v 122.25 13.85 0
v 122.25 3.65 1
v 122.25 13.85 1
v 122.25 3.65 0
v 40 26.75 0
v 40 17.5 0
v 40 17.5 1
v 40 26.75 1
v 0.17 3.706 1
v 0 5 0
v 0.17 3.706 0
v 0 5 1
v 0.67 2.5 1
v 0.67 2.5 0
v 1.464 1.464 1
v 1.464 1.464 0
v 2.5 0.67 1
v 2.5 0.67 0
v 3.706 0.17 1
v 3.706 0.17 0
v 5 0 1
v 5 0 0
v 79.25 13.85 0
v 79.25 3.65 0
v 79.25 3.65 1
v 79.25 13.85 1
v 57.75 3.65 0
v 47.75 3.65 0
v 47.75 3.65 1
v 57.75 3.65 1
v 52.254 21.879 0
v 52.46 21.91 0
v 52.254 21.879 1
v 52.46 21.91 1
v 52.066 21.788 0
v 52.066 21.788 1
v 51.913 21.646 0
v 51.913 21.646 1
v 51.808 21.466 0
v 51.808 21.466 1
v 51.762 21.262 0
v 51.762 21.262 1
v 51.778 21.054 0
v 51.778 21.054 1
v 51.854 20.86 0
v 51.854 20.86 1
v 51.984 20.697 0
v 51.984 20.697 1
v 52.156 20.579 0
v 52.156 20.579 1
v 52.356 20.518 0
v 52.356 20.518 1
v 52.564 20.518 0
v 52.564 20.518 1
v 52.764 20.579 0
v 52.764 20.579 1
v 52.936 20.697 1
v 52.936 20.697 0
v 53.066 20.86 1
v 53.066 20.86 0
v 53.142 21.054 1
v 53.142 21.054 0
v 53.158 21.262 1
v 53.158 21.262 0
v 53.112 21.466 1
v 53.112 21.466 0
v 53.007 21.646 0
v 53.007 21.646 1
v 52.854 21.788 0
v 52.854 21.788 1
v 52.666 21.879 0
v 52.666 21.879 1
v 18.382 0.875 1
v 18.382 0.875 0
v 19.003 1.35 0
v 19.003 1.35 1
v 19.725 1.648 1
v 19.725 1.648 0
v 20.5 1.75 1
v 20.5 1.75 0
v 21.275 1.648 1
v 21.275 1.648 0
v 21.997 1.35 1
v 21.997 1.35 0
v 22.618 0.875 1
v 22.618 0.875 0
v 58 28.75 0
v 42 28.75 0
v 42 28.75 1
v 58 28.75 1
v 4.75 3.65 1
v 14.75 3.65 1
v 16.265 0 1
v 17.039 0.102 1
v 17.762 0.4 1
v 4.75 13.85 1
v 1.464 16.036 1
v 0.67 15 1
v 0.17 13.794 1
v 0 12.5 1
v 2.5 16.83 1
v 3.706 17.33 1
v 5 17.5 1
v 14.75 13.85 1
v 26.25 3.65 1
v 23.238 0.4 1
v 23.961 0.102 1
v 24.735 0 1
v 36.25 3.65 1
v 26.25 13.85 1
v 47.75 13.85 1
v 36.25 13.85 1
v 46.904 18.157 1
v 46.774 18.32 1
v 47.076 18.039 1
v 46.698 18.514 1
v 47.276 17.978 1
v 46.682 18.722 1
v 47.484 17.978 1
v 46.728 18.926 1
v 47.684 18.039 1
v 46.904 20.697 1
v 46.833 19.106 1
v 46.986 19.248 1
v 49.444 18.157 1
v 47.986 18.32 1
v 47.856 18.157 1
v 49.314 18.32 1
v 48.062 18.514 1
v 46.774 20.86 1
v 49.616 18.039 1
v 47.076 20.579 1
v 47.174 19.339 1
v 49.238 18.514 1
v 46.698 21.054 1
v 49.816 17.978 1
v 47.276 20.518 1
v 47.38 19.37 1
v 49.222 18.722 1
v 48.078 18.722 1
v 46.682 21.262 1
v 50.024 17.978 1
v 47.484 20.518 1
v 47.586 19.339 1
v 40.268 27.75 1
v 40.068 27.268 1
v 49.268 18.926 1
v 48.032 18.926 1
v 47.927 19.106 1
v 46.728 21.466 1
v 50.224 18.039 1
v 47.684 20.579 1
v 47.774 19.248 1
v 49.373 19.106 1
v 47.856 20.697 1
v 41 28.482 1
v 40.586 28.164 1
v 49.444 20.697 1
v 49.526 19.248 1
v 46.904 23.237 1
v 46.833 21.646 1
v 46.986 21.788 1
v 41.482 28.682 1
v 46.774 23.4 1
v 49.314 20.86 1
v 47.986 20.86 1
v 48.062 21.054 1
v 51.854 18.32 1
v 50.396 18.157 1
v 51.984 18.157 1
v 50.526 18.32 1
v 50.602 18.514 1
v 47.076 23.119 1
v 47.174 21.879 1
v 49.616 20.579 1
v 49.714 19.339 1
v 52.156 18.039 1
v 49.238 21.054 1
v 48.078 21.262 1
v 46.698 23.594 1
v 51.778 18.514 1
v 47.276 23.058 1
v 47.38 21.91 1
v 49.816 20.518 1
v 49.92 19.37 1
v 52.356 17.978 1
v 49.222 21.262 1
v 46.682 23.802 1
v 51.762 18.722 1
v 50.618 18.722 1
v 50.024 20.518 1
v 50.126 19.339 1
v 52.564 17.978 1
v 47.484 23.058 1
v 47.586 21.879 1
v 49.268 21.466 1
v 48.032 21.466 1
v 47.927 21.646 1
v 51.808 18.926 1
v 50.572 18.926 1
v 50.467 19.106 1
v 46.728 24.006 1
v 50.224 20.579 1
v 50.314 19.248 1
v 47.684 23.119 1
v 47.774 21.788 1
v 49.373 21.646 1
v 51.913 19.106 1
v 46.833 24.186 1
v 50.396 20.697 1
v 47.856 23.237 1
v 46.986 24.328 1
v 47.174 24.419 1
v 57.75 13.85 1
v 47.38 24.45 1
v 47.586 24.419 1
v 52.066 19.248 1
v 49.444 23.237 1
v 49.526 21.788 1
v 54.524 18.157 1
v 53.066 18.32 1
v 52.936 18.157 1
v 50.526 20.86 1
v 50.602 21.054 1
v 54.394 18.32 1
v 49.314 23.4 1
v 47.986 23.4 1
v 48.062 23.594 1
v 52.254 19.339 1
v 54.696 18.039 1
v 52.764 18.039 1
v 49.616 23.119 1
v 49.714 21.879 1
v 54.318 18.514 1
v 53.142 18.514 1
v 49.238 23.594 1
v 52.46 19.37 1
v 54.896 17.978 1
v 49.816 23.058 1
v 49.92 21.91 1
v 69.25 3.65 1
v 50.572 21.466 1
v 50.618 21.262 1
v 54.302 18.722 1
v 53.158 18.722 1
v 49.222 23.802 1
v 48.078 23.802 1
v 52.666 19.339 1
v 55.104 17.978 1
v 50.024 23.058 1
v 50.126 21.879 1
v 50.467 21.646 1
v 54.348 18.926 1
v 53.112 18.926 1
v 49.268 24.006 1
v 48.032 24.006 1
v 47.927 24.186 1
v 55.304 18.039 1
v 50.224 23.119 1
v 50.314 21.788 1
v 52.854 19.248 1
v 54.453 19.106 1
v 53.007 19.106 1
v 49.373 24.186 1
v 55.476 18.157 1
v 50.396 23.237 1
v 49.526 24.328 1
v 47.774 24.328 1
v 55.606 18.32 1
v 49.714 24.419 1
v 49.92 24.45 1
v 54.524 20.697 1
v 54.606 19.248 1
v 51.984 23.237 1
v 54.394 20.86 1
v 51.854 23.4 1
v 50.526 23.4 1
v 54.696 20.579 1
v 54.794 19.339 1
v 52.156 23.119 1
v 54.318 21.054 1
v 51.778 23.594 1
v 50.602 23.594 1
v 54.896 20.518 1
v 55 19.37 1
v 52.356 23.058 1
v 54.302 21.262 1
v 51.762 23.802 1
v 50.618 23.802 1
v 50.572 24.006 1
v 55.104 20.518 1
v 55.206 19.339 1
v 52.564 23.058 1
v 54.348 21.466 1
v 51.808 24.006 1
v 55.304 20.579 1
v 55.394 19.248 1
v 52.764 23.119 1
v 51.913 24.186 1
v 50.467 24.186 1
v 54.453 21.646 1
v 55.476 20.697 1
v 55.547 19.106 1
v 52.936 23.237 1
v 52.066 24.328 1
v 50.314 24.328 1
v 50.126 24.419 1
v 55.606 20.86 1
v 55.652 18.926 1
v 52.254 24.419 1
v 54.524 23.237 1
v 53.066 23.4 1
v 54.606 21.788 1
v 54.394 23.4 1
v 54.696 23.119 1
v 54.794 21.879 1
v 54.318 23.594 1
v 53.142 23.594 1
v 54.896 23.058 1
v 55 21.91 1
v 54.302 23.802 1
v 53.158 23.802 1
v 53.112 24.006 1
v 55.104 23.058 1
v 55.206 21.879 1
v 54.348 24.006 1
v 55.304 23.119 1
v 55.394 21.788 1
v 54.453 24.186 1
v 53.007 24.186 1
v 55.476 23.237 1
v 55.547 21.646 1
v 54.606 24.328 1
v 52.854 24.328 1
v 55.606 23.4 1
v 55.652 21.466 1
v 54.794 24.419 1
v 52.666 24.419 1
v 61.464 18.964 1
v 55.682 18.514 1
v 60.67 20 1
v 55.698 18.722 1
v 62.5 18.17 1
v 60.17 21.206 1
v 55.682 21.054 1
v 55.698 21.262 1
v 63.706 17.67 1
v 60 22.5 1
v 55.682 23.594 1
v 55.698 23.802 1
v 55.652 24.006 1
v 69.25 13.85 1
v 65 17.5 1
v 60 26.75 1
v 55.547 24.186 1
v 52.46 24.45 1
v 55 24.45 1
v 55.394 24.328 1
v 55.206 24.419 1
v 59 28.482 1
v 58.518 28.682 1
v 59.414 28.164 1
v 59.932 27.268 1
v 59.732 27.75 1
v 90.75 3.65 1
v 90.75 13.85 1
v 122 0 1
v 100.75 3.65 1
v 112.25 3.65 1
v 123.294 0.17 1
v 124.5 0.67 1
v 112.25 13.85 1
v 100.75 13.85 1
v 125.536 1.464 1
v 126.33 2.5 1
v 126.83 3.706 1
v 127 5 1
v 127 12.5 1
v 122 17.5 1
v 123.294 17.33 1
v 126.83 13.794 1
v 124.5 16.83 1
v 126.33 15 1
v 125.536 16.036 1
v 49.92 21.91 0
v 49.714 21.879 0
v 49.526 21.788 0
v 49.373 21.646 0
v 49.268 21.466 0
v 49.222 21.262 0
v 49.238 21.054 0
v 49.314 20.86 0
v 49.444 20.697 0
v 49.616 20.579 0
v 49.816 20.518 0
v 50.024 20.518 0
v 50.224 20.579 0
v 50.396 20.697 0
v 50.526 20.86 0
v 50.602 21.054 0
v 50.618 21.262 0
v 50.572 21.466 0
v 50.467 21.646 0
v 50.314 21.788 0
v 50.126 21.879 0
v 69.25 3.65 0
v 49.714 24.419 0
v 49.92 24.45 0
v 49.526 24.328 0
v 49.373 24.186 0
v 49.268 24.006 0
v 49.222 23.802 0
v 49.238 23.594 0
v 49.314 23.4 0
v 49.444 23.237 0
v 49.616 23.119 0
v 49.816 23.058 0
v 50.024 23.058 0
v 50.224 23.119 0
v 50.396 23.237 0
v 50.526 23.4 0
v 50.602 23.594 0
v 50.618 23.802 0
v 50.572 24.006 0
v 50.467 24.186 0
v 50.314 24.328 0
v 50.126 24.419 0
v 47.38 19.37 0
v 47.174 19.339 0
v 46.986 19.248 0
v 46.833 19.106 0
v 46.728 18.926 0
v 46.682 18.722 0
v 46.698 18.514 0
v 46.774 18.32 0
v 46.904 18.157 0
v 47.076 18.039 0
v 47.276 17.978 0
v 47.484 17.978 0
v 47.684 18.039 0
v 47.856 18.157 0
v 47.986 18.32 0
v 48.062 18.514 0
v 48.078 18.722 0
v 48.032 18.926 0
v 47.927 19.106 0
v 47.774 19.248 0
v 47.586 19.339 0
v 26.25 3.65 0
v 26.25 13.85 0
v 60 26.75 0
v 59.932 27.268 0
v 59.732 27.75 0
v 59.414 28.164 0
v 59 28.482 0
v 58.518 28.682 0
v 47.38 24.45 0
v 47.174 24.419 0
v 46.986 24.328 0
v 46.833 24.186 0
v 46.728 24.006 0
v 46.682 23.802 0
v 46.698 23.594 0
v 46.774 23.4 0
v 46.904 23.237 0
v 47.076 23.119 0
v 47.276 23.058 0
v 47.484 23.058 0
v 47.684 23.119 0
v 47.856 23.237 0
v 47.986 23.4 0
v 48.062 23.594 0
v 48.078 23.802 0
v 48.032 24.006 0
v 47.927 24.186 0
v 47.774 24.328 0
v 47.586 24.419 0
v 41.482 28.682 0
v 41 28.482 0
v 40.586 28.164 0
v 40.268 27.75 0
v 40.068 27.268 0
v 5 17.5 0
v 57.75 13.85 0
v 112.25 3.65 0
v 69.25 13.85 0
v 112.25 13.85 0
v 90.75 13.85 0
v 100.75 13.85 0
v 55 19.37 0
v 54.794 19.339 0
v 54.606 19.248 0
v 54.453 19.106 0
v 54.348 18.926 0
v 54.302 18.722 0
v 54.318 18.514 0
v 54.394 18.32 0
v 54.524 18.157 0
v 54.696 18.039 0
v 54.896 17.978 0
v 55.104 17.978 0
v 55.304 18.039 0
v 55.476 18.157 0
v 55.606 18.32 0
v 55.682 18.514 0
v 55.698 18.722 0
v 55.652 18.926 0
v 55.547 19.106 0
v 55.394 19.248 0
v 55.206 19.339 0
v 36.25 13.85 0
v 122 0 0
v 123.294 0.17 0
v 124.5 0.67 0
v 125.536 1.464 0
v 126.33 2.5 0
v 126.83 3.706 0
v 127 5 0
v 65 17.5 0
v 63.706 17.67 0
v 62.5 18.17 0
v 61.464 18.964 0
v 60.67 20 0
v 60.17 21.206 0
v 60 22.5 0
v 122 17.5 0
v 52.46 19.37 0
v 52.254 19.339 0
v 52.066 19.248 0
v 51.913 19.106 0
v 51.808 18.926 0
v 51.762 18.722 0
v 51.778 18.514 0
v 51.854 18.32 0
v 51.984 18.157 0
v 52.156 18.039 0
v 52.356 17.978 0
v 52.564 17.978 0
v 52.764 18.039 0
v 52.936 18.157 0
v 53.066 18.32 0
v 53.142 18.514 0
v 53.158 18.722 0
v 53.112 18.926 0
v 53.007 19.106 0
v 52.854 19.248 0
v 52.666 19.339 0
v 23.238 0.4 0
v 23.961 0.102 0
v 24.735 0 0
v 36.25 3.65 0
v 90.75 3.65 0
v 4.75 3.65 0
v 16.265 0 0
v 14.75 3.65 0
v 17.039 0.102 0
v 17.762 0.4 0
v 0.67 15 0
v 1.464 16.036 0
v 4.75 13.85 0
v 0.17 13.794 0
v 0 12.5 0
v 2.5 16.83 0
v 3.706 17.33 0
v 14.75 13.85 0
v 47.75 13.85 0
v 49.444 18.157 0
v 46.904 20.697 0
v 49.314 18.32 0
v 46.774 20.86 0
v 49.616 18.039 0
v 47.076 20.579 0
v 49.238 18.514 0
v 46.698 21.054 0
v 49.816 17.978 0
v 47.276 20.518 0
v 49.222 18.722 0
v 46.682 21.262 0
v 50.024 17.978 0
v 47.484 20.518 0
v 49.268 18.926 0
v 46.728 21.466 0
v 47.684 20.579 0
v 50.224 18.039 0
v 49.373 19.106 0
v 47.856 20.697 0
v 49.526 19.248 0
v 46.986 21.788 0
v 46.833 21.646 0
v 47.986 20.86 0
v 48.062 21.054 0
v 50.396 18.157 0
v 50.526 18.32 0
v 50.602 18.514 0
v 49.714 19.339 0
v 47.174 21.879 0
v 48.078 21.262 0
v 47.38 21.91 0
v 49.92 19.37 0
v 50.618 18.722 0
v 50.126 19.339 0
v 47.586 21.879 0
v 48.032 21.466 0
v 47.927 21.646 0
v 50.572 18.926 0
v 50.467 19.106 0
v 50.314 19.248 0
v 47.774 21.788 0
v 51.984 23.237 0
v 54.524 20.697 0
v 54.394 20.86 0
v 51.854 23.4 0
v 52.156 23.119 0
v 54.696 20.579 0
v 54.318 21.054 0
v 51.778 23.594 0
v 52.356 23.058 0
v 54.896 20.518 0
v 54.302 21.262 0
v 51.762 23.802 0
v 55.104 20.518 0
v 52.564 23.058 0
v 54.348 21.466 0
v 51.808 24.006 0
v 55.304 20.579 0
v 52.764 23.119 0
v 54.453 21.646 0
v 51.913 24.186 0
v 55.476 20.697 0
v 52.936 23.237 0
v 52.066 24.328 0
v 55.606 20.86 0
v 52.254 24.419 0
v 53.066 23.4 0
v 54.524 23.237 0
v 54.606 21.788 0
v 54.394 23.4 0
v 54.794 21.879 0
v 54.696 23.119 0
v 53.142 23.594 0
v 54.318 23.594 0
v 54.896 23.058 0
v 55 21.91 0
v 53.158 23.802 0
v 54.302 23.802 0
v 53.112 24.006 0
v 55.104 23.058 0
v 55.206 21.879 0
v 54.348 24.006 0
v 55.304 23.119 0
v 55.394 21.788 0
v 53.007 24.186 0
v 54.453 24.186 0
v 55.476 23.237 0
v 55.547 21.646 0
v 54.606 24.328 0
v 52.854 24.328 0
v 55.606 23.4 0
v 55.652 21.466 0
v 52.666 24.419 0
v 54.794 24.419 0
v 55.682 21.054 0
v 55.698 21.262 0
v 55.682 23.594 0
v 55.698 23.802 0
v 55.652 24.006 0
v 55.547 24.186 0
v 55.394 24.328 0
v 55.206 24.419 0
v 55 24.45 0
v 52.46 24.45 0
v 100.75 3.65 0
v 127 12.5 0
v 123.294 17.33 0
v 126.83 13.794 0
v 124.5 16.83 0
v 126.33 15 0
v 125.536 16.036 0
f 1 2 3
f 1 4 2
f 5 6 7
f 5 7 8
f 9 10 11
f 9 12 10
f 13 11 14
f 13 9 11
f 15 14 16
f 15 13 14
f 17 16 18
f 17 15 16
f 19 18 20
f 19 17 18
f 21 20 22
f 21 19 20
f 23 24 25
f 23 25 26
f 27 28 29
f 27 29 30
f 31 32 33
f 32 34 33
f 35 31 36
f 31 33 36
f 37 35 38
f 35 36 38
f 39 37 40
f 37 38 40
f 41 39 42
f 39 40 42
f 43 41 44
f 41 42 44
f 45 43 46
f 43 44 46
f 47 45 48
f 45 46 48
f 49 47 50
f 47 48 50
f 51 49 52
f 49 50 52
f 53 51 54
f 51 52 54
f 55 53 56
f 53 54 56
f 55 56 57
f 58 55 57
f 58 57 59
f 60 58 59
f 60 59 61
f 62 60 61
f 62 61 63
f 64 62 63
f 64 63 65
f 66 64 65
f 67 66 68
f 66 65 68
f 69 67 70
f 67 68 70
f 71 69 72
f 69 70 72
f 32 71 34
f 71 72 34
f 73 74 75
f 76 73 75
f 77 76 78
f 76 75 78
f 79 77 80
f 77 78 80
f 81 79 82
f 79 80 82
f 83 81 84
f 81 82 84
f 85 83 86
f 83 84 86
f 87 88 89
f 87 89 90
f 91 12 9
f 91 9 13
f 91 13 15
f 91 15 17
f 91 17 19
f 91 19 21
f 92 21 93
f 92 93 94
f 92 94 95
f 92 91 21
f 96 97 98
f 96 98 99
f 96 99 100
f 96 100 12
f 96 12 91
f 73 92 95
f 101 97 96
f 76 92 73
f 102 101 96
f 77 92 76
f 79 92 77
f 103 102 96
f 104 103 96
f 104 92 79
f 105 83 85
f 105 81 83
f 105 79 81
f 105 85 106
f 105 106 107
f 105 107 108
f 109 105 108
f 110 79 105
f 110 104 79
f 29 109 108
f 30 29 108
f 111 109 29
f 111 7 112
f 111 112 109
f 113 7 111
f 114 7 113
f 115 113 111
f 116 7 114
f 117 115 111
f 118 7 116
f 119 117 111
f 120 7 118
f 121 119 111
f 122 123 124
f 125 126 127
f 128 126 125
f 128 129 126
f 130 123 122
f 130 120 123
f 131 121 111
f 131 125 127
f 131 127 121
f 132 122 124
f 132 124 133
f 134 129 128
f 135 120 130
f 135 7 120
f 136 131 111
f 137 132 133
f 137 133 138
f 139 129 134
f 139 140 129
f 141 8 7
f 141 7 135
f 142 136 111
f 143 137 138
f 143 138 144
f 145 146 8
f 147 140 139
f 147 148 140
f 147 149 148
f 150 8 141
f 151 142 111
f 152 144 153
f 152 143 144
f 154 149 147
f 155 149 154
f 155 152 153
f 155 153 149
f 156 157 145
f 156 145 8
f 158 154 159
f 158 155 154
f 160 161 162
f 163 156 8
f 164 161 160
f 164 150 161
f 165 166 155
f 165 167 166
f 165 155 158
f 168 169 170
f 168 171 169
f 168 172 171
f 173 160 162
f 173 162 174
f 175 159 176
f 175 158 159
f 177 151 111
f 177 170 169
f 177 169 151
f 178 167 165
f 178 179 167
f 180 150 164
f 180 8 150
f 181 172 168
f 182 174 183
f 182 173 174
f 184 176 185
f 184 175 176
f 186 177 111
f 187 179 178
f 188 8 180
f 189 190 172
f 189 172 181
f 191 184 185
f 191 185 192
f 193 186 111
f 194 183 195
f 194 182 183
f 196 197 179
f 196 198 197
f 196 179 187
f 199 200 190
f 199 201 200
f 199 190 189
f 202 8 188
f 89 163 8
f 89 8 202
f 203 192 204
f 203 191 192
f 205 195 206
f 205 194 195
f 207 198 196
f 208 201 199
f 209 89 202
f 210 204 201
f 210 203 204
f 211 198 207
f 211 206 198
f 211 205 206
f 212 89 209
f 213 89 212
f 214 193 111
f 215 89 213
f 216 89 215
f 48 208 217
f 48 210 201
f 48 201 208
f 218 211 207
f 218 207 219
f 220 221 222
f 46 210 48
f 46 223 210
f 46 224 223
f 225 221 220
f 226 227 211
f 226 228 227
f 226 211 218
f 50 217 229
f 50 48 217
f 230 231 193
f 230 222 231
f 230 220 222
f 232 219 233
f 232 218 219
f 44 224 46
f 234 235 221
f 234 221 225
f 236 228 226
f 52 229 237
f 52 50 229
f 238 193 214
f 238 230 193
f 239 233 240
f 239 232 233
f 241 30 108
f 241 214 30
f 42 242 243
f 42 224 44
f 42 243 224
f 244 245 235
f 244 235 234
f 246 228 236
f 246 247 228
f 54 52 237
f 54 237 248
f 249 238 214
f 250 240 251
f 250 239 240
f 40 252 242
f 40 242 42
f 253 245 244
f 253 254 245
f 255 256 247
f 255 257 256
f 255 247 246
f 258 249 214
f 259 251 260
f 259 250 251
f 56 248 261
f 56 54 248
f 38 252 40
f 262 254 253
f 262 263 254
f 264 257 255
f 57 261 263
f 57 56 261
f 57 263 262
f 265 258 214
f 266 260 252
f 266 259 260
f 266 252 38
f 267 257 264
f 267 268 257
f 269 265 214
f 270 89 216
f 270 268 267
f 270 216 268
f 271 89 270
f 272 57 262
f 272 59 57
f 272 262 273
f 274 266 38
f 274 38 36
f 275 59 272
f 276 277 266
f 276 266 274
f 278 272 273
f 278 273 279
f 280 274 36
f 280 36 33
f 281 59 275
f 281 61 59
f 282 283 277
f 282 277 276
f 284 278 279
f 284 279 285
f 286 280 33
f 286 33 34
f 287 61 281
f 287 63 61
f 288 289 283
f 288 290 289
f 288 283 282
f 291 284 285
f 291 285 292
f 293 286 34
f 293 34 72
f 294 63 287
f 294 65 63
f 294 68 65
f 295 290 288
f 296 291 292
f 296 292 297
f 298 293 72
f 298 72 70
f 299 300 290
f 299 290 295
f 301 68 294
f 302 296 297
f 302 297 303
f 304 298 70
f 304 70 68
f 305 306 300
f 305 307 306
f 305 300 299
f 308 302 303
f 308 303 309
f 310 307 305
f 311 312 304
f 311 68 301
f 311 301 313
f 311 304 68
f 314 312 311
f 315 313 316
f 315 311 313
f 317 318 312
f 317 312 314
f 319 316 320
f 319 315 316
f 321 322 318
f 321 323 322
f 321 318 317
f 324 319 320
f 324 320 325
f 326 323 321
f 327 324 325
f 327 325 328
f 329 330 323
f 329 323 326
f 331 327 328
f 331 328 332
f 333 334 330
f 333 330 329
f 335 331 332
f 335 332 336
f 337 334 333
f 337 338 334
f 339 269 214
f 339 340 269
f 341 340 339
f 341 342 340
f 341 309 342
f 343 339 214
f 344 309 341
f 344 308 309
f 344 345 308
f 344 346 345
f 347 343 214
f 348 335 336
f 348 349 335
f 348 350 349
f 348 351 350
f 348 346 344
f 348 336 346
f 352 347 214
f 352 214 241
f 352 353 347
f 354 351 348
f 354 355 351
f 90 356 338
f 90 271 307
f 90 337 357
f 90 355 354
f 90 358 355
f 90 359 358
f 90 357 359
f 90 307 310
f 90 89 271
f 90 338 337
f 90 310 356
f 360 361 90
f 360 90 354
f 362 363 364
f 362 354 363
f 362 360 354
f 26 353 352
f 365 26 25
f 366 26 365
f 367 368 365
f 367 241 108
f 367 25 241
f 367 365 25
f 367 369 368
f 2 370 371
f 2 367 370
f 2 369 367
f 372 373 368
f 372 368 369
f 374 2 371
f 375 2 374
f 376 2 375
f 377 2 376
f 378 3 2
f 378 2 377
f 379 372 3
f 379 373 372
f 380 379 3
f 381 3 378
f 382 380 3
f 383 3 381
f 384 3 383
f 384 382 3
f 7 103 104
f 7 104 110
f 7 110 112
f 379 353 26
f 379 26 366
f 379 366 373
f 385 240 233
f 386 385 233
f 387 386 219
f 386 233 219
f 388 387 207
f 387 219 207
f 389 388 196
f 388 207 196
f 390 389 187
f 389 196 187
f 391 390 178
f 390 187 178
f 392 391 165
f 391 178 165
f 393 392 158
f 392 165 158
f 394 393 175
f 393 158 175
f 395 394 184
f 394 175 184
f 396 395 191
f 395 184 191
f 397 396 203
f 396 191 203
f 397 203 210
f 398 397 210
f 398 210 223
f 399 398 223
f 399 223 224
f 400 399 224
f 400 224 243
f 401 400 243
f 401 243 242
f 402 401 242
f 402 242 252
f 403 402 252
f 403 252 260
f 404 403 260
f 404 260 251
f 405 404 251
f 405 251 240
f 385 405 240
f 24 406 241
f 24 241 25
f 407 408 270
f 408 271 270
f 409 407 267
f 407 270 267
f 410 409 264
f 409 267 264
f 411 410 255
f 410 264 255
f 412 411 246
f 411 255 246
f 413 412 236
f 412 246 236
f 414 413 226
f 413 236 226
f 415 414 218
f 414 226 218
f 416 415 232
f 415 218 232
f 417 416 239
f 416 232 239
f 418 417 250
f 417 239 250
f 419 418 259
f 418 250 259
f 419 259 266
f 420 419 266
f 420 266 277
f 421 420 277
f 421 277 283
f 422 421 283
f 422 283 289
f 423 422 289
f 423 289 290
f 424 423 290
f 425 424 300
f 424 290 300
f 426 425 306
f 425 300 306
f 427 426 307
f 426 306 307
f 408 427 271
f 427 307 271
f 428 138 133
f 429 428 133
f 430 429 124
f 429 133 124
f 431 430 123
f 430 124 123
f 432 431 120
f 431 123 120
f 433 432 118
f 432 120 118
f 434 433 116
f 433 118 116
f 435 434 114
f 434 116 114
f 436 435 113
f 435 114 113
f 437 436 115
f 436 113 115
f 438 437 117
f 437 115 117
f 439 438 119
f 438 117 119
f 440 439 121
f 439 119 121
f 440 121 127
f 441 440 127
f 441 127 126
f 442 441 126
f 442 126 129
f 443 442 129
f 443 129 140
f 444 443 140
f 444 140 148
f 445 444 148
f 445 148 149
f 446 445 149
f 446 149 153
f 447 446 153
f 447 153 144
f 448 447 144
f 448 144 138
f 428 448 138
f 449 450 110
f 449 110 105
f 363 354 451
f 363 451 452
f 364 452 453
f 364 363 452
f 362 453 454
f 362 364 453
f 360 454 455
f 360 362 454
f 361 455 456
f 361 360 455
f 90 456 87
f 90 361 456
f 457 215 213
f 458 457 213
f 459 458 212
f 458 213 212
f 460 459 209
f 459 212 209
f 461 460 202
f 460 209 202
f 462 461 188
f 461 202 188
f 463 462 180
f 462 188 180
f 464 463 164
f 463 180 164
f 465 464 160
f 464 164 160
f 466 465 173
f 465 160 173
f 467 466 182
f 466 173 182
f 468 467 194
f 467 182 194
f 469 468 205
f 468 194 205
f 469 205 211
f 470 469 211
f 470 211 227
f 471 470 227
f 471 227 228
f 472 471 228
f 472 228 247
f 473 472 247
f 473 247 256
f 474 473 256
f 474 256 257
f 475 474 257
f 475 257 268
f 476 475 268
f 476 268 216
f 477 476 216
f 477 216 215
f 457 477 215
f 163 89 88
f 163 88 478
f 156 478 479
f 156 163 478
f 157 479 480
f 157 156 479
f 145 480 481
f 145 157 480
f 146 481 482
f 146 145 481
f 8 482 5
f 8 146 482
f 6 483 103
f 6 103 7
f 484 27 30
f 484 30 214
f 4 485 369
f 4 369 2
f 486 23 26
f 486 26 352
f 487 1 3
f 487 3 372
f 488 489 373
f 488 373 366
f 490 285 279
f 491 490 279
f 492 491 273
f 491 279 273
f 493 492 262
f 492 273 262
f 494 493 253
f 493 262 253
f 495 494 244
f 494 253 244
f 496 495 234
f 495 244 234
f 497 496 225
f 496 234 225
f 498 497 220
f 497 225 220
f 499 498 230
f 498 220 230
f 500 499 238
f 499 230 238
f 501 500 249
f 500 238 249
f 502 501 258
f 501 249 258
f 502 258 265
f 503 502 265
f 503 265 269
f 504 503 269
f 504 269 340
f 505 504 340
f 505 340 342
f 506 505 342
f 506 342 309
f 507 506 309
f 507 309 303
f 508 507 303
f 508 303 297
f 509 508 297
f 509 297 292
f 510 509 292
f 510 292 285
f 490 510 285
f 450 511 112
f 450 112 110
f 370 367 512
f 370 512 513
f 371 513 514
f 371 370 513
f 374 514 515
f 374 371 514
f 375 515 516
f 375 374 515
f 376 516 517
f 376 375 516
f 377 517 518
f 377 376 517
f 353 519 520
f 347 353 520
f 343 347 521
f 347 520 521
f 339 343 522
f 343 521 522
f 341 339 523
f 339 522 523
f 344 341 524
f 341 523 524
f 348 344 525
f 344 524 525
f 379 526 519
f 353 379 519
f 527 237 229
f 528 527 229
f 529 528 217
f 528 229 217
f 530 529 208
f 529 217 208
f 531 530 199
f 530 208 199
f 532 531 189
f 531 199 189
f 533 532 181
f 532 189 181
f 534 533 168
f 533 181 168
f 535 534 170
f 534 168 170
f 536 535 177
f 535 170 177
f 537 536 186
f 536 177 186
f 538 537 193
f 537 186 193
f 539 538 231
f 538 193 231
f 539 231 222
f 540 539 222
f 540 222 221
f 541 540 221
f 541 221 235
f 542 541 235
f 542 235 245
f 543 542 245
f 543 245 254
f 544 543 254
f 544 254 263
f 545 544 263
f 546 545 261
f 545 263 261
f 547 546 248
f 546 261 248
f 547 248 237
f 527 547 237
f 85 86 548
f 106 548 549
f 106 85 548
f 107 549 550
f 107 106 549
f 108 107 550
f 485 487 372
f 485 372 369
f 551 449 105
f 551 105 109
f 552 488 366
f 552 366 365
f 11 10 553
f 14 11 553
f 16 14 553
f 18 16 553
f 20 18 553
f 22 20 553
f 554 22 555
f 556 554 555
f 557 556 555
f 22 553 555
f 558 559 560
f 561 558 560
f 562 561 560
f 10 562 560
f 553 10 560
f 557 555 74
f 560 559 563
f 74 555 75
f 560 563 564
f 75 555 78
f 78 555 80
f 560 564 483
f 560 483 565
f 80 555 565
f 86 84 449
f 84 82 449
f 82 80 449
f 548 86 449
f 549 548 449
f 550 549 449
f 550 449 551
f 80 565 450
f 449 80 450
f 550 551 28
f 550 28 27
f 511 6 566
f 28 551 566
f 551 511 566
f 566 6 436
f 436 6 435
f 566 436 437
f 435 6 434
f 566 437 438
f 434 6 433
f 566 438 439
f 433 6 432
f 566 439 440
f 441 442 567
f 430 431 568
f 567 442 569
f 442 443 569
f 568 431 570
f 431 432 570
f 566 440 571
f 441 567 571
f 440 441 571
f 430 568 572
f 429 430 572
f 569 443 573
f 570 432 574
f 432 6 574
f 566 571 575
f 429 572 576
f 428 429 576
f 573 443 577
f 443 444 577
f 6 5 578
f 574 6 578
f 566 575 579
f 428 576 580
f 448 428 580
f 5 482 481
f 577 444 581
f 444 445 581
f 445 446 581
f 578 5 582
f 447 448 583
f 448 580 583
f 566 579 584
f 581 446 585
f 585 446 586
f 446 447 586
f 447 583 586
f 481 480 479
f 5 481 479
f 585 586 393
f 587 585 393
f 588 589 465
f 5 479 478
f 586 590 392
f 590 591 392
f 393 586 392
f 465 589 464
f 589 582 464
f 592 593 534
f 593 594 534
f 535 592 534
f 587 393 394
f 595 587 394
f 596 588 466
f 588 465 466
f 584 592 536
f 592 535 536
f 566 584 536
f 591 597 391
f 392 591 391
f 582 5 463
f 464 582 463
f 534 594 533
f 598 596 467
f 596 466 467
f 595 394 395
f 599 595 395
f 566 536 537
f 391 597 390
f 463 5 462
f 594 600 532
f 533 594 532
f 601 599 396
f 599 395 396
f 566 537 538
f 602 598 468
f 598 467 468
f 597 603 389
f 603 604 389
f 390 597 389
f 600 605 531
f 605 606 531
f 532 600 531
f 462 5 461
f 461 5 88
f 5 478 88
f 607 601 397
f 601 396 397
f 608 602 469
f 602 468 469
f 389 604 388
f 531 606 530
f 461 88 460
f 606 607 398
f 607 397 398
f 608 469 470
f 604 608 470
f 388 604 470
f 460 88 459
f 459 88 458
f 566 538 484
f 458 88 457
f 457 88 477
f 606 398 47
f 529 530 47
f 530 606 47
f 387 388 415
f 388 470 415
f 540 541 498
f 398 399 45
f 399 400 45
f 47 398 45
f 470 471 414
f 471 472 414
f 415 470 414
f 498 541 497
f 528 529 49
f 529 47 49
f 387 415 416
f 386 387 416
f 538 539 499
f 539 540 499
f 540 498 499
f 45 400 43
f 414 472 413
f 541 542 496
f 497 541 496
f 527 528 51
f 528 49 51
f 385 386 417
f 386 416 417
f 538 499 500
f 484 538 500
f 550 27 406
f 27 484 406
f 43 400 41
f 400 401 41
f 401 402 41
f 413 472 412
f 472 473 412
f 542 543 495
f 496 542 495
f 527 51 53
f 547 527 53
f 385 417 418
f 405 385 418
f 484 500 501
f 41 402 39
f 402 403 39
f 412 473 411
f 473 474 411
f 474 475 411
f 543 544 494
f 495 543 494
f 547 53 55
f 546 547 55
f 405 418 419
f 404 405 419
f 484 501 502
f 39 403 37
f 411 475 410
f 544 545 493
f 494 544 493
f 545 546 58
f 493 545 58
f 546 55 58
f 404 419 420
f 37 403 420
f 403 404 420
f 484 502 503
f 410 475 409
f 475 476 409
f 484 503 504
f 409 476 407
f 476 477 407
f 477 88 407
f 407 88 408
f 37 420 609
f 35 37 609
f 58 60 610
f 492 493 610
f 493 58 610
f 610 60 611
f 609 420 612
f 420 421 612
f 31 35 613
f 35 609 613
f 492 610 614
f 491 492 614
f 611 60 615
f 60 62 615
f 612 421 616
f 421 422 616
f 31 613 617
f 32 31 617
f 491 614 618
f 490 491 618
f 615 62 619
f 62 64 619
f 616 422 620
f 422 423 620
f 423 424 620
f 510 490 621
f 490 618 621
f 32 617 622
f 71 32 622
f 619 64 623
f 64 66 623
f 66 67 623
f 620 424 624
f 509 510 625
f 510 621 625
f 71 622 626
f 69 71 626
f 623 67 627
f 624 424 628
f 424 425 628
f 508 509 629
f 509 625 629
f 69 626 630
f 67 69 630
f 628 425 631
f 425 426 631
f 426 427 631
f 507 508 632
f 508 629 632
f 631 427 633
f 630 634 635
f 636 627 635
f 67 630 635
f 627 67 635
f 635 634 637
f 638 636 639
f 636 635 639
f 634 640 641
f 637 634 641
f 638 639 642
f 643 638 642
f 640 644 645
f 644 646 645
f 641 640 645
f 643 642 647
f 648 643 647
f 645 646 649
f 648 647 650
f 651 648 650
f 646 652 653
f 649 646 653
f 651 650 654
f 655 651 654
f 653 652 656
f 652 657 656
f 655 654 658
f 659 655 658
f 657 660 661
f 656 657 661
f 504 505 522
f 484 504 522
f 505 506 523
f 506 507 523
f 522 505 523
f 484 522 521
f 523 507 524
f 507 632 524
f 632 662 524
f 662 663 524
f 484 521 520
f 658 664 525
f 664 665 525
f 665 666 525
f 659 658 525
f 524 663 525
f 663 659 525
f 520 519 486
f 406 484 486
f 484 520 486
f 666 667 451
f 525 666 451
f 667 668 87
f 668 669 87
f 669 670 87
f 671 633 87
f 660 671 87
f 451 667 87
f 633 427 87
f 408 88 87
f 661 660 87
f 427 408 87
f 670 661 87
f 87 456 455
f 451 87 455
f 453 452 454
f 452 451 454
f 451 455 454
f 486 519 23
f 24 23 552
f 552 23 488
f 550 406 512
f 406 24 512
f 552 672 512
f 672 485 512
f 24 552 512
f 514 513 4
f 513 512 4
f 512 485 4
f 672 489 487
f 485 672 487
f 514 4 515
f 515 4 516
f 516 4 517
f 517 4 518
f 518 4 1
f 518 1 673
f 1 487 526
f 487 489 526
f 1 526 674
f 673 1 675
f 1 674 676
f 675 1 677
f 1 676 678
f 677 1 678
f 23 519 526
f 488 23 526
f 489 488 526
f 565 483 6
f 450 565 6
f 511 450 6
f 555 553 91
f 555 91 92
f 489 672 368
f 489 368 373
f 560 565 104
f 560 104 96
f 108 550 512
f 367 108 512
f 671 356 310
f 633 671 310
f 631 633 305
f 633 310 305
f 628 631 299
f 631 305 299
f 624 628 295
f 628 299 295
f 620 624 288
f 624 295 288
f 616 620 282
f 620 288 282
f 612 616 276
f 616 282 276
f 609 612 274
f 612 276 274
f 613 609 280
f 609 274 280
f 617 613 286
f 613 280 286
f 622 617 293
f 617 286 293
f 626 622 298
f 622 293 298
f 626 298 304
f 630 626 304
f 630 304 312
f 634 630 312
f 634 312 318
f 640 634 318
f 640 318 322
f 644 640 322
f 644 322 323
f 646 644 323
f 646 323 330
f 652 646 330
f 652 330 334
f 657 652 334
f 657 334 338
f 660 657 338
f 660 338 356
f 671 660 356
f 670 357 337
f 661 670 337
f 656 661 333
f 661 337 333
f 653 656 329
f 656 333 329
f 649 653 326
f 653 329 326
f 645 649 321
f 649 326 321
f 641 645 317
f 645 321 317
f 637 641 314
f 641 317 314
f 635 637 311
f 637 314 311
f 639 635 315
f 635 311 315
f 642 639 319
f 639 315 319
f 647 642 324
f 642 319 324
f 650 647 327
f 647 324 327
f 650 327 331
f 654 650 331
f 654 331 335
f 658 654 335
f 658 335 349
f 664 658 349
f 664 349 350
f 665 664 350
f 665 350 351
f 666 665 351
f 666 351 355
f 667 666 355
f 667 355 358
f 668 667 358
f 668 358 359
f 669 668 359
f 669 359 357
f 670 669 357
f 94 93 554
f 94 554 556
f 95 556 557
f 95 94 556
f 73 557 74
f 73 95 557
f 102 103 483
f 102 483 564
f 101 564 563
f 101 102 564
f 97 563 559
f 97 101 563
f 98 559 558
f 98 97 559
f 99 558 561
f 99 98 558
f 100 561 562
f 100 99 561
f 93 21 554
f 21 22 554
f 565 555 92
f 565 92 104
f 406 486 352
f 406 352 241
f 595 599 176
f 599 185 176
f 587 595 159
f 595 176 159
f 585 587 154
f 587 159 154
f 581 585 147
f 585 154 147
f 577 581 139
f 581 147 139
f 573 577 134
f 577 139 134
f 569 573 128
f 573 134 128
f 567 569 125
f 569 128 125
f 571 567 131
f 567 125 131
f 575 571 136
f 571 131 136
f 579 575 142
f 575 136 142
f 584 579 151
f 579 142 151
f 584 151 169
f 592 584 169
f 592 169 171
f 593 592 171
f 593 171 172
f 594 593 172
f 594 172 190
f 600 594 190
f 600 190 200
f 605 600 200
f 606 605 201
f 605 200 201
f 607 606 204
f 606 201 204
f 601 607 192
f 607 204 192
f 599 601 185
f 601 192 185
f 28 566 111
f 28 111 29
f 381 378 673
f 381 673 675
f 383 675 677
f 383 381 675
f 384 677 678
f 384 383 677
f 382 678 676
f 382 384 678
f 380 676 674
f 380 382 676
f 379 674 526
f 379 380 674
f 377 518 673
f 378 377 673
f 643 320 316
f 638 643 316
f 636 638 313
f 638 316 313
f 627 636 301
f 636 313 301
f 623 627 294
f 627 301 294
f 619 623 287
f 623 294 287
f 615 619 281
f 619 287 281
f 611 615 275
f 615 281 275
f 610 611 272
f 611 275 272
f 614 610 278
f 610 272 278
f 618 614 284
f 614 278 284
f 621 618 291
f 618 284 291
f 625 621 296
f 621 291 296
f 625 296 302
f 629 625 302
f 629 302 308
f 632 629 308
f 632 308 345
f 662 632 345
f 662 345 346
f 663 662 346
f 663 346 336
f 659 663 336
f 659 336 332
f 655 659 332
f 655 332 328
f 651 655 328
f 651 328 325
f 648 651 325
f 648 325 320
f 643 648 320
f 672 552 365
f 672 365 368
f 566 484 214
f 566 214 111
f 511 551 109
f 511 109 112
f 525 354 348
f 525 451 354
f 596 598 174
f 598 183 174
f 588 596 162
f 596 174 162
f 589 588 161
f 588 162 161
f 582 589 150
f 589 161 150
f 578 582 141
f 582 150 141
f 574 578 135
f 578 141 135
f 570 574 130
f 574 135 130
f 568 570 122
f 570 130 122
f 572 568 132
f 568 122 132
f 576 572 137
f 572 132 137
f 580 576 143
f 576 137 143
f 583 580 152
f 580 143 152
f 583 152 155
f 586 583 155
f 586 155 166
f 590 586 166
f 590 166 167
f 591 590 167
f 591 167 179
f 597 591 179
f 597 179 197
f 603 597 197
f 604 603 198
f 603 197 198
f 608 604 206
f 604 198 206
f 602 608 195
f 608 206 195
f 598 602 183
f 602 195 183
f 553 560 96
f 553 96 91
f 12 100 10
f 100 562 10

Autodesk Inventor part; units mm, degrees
ref_plane "YZ Plane" through (0, 0, 0) normal (1, 0, 0) x (0, 1, 0)
ref_plane "XZ Plane" through (0, 0, 0) normal (0, 1, 0) x (-1, 0, 0)
ref_plane "XY Plane" through (0, 0, 0) normal (0, 0, 1) x (1, 0, 0)
sketch "Skizze1" plane through (0, 0, 0) normal (0, 0, 1) x (1, 0, 0)
  line L0 (0, 0) -> (127, 0)
  line L1 (127, 0) -> (127, 37.5)
  line L2 (127, 37.5) -> (0, 37.5)
  line L3 (0, 37.5) -> (0, 0)
  line L4 (4.75, 3.65) -> (14.75, 3.65)
  line L5 (14.75, 3.65) -> (14.75, 13.85)
  line L6 (14.75, 13.85) -> (4.75, 13.85)
  line L7 (4.75, 13.85) -> (4.75, 3.65)
  line L8 (4.75, 33.85) -> (4.75, 23.65)
  line L9 (14.75, 33.85) -> (4.75, 33.85)
  line L10 (14.75, 23.65) -> (14.75, 33.85)
  line L11 (4.75, 23.65) -> (14.75, 23.65)
  line L12 (26.25, 13.85) -> (26.25, 3.65)
  line L13 (36.25, 13.85) -> (26.25, 13.85)
  line L14 (36.25, 3.65) -> (36.25, 13.85)
  line L15 (26.25, 3.65) -> (36.25, 3.65)
  line L16 (26.25, 33.85) -> (26.25, 23.65)
  line L17 (36.25, 33.85) -> (26.25, 33.85)
  line L18 (36.25, 23.65) -> (36.25, 33.85)
  line L19 (26.25, 23.65) -> (36.25, 23.65)
  line L20 (47.75, 13.85) -> (47.75, 3.65)
  line L21 (57.75, 13.85) -> (47.75, 13.85)
  line L22 (57.75, 3.65) -> (57.75, 13.85)
  line L23 (47.75, 3.65) -> (57.75, 3.65)
  line L24 (47.75, 33.85) -> (47.75, 23.65)
  line L25 (57.75, 33.85) -> (47.75, 33.85)
  line L26 (57.75, 23.65) -> (57.75, 33.85)
  line L27 (47.75, 23.65) -> (57.75, 23.65)
  line L28 (69.25, 13.85) -> (69.25, 3.65)
  line L29 (79.25, 13.85) -> (69.25, 13.85)
  line L30 (79.25, 3.65) -> (79.25, 13.85)
  line L31 (69.25, 3.65) -> (79.25, 3.65)
  line L32 (69.25, 33.85) -> (69.25, 23.65)
  line L33 (79.25, 33.85) -> (69.25, 33.85)
  line L34 (79.25, 23.65) -> (79.25, 33.85)
  line L35 (69.25, 23.65) -> (79.25, 23.65)
  line L36 (90.75, 13.85) -> (90.75, 3.65)
  line L37 (100.75, 13.85) -> (90.75, 13.85)
  line L38 (100.75, 3.65) -> (100.75, 13.85)
  line L39 (90.75, 3.65) -> (100.75, 3.65)
  line L40 (90.75, 33.85) -> (90.75, 23.65)
  line L41 (100.75, 33.85) -> (90.75, 33.85)
  line L42 (100.75, 23.65) -> (100.75, 33.85)
  line L43 (90.75, 23.65) -> (100.75, 23.65)
  line L44 (112.25, 13.85) -> (112.25, 3.65)
  line L45 (122.25, 13.85) -> (112.25, 13.85)
  line L46 (122.25, 3.65) -> (122.25, 13.85)
  line L47 (112.25, 3.65) -> (122.25, 3.65)
  line L48 (112.25, 33.85) -> (112.25, 23.65)
  line L49 (122.25, 33.85) -> (112.25, 33.85)
  line L50 (122.25, 23.65) -> (122.25, 33.85)
  line L51 (112.25, 23.65) -> (122.25, 23.65)
  line L52 (0, 18.75) -> (40, 18.75)
  line L53 (40, 18.75) -> (40, 28.75)
  line L54 (40, 28.75) -> (60, 28.75)
  line L55 (60, 28.75) -> (60, 23.75)
  arc A0 (60, 23.75) -> (65, 18.75) centre (65, 23.75) ccw
  line L56 (65, 18.75) -> (127, 18.75)
  arc A1 (23.2272, 0) -> (17.7728, 0) centre (20.5, -1.25) ccw
  line L57 (0, 17.5) -> (40, 17.5)
  line L58 (40, 17.5) -> (40, 18.75)
  line L59 (127, 17.5) -> (65, 17.5)
  arc A2 (60, 22.5) -> (65, 17.5) centre (65, 22.5) ccw
  line L60 (60, 22.5) -> (60, 23.75)
  point P0 (63.5, 37.5)
  point P1 (42, 18.75)
  point P2 (85, 18.75)
  point P3 (63.5, 0)
  point P4 (55, 23.75)
  point P5 (52.46, 23.75)
  point P6 (49.92, 23.75)
  point P7 (47.38, 23.75)
  point P8 (55, 21.21)
  point P9 (52.46, 21.21)
  point P10 (49.92, 21.21)
  point P11 (47.38, 21.21)
  point P12 (55, 18.67)
  point P13 (52.46, 18.67)
  point P14 (49.92, 18.67)
  point P15 (47.38, 18.67)
  point P16 (31.25, 3.65)
  point P17 (4.75, 8.75)
  dimension "d0" = 127
  dimension "d1" = 37.5
  dimension "d2" = 10.2
  dimension "d3" = 10
  dimension "d6" = 20
  dimension "d9" = 21.5
  dimension "d13" = 5.75
  dimension "d17" = 43
  dimension "d18" = 21.5
  dimension "d19" = 28.75
  dimension "d20" = 60
  dimension "d21" = 5
  dimension "d22" = 20
  dimension "d24" = 5
  dimension "d36" = 2.54
  dimension "d39" = 2.54
  dimension "d43" = 3
  dimension "d44" = 1.25
  dimension "d45" = 10.75
  dimension "d48" = 8.75
  dimension "d49" = 8.75
  dimension "d50" = 5
extrude "Extrusion1" add sketch "Skizze1" along normal blind 1 contours L3 L57 L58 L53 L54 L24 L27 L26 L55 L60 A2 L59 L1 L0 A1 | L54 L26 L27 L24
fillet "Rundung1" radius 5 2 edges at (127, 0, 0.5) (0, 0, 0.5)
hole "Bohrung1" at (55, 23.75, 0) at (55, 21.21, 0) at (52.46, 21.21, 0) at (49.92, 21.21, 0) at (49.92, 23.75, 0) at (52.46, 23.75, 0) at (55, 18.67, 0) at (52.46, 18.67, 0) at (49.92, 18.67, 0) at (47.38, 18.67, 0) at (47.38, 21.21, 0) at (47.38, 23.75, 0) direction (0, 0, 1) diameter 1.4 end through all
fillet "Rundung2" radius 2 2 edges at (60, 28.75, 0.5) (40, 28.75, 0.5)
fillet "Rundung3" radius 5 2 edges at (127, 17.5, 0.5) (0, 17.5, 0.5)
fillet "Rundung4" radius 3 2 edges at (17.7728, 0, 0.5) (23.2272, 0, 0.5)
sketch "Skizze2" plane through (0, 0, 1) normal (0, 0, 1) x (1, 0, 0)
  arc A0 (0, 5) -> (5, 0) centre (5, 5) ccw projected
  line L0 (5, 0) -> (16.2647, 0) projected
  arc A1 (122, 0) -> (127, 5) centre (122, 5) ccw projected
  line L1 (127, 5) -> (127, 12.5) projected
  line L2 (0, 12.5) -> (0, 5) projected
  line L3 (112.25, 13.85) -> (122.25, 13.85) projected
  line L4 (122.25, 13.85) -> (122.25, 3.65) projected
  line L5 (122.25, 3.65) -> (112.25, 3.65) projected
  line L6 (112.25, 3.65) -> (112.25, 13.85) projected
  line L7 (90.75, 13.85) -> (100.75, 13.85) projected
  line L8 (100.75, 13.85) -> (100.75, 3.65) projected
  line L9 (100.75, 3.65) -> (90.75, 3.65) projected
  line L10 (90.75, 3.65) -> (90.75, 13.85) projected
  line L11 (69.25, 13.85) -> (79.25, 13.85) projected
  line L12 (79.25, 13.85) -> (79.25, 3.65) projected
  line L13 (79.25, 3.65) -> (69.25, 3.65) projected
  line L14 (69.25, 3.65) -> (69.25, 13.85) projected
  line L15 (47.75, 13.85) -> (57.75, 13.85) projected
  line L16 (57.75, 13.85) -> (57.75, 3.65) projected
  line L17 (57.75, 3.65) -> (47.75, 3.65) projected
  line L18 (47.75, 3.65) -> (47.75, 13.85) projected
  line L19 (26.25, 13.85) -> (36.25, 13.85) projected
  line L20 (36.25, 13.85) -> (36.25, 3.65) projected
  line L21 (36.25, 3.65) -> (26.25, 3.65) projected
  line L22 (26.25, 3.65) -> (26.25, 13.85) projected
  line L23 (4.75, 3.65) -> (4.75, 13.85) projected
  line L24 (4.75, 13.85) -> (14.75, 13.85) projected
  line L25 (14.75, 13.85) -> (14.75, 3.65) projected
  line L26 (14.75, 3.65) -> (4.75, 3.65) projected
  line L27 (60, 22.5) -> (60, 26.75) projected
  line L28 (58, 28.75) -> (42, 28.75) projected
  line L29 (40, 26.75) -> (40, 17.5) projected
  arc A2 (60, 26.75) -> (58, 28.75) centre (58, 26.75) ccw projected
  arc A3 (42, 28.75) -> (40, 26.75) centre (42, 26.75) ccw projected
  circle A4 centre (55, 23.75) radius 0.7 projected
  arc A5 (22.6176, 0.875) -> (18.3824, 0.875) centre (20.5, -1.25) ccw projected
  line L30 (24.7353, 0) -> (122, 0) projected
  arc A6 (22.6176, 0.875) -> (24.7353, 0) centre (24.7353, 3) ccw projected
  arc A7 (16.2647, 0) -> (18.3824, 0.875) centre (16.2647, 3) ccw projected
  line L31 (122, 17.5) -> (65, 17.5) projected
  arc A8 (60, 22.5) -> (65, 17.5) centre (65, 22.5) ccw projected
  line L32 (40, 17.5) -> (5, 17.5) projected
  arc A9 (127, 12.5) -> (122, 17.5) centre (122, 12.5) ccw projected
  arc A10 (5, 17.5) -> (0, 12.5) centre (5, 12.5) ccw projected
  circle A11 centre (47.38, 18.67) radius 0.7 projected
  circle A12 centre (47.38, 21.21) radius 0.7 projected
  circle A13 centre (47.38, 23.75) radius 0.7 projected
  circle A14 centre (49.92, 23.75) radius 0.7 projected
  circle A15 centre (49.92, 21.21) radius 0.7 projected
  circle A16 centre (49.92, 18.67) radius 0.7 projected
  circle A17 centre (52.46, 18.67) radius 0.7 projected
  circle A18 centre (52.46, 21.21) radius 0.7 projected
  circle A19 centre (52.46, 23.75) radius 0.7 projected
  circle A20 centre (55, 21.21) radius 0.7 projected
  circle A21 centre (55, 18.67) radius 0.7 projected
  point P0 (0, 0)
equation "\"d13\" = -0.5 * d3 + 0.5 * d9"
equation "\"d17\" = 2 * d9"
equation "\"d18\" = 0.5 * d17"
equation "\"d45\" = 0.5 * d9"
equation "\"d49\" = d48"
properties part number "bat_contacts_v2_plate_contact" material "Kupfer"
